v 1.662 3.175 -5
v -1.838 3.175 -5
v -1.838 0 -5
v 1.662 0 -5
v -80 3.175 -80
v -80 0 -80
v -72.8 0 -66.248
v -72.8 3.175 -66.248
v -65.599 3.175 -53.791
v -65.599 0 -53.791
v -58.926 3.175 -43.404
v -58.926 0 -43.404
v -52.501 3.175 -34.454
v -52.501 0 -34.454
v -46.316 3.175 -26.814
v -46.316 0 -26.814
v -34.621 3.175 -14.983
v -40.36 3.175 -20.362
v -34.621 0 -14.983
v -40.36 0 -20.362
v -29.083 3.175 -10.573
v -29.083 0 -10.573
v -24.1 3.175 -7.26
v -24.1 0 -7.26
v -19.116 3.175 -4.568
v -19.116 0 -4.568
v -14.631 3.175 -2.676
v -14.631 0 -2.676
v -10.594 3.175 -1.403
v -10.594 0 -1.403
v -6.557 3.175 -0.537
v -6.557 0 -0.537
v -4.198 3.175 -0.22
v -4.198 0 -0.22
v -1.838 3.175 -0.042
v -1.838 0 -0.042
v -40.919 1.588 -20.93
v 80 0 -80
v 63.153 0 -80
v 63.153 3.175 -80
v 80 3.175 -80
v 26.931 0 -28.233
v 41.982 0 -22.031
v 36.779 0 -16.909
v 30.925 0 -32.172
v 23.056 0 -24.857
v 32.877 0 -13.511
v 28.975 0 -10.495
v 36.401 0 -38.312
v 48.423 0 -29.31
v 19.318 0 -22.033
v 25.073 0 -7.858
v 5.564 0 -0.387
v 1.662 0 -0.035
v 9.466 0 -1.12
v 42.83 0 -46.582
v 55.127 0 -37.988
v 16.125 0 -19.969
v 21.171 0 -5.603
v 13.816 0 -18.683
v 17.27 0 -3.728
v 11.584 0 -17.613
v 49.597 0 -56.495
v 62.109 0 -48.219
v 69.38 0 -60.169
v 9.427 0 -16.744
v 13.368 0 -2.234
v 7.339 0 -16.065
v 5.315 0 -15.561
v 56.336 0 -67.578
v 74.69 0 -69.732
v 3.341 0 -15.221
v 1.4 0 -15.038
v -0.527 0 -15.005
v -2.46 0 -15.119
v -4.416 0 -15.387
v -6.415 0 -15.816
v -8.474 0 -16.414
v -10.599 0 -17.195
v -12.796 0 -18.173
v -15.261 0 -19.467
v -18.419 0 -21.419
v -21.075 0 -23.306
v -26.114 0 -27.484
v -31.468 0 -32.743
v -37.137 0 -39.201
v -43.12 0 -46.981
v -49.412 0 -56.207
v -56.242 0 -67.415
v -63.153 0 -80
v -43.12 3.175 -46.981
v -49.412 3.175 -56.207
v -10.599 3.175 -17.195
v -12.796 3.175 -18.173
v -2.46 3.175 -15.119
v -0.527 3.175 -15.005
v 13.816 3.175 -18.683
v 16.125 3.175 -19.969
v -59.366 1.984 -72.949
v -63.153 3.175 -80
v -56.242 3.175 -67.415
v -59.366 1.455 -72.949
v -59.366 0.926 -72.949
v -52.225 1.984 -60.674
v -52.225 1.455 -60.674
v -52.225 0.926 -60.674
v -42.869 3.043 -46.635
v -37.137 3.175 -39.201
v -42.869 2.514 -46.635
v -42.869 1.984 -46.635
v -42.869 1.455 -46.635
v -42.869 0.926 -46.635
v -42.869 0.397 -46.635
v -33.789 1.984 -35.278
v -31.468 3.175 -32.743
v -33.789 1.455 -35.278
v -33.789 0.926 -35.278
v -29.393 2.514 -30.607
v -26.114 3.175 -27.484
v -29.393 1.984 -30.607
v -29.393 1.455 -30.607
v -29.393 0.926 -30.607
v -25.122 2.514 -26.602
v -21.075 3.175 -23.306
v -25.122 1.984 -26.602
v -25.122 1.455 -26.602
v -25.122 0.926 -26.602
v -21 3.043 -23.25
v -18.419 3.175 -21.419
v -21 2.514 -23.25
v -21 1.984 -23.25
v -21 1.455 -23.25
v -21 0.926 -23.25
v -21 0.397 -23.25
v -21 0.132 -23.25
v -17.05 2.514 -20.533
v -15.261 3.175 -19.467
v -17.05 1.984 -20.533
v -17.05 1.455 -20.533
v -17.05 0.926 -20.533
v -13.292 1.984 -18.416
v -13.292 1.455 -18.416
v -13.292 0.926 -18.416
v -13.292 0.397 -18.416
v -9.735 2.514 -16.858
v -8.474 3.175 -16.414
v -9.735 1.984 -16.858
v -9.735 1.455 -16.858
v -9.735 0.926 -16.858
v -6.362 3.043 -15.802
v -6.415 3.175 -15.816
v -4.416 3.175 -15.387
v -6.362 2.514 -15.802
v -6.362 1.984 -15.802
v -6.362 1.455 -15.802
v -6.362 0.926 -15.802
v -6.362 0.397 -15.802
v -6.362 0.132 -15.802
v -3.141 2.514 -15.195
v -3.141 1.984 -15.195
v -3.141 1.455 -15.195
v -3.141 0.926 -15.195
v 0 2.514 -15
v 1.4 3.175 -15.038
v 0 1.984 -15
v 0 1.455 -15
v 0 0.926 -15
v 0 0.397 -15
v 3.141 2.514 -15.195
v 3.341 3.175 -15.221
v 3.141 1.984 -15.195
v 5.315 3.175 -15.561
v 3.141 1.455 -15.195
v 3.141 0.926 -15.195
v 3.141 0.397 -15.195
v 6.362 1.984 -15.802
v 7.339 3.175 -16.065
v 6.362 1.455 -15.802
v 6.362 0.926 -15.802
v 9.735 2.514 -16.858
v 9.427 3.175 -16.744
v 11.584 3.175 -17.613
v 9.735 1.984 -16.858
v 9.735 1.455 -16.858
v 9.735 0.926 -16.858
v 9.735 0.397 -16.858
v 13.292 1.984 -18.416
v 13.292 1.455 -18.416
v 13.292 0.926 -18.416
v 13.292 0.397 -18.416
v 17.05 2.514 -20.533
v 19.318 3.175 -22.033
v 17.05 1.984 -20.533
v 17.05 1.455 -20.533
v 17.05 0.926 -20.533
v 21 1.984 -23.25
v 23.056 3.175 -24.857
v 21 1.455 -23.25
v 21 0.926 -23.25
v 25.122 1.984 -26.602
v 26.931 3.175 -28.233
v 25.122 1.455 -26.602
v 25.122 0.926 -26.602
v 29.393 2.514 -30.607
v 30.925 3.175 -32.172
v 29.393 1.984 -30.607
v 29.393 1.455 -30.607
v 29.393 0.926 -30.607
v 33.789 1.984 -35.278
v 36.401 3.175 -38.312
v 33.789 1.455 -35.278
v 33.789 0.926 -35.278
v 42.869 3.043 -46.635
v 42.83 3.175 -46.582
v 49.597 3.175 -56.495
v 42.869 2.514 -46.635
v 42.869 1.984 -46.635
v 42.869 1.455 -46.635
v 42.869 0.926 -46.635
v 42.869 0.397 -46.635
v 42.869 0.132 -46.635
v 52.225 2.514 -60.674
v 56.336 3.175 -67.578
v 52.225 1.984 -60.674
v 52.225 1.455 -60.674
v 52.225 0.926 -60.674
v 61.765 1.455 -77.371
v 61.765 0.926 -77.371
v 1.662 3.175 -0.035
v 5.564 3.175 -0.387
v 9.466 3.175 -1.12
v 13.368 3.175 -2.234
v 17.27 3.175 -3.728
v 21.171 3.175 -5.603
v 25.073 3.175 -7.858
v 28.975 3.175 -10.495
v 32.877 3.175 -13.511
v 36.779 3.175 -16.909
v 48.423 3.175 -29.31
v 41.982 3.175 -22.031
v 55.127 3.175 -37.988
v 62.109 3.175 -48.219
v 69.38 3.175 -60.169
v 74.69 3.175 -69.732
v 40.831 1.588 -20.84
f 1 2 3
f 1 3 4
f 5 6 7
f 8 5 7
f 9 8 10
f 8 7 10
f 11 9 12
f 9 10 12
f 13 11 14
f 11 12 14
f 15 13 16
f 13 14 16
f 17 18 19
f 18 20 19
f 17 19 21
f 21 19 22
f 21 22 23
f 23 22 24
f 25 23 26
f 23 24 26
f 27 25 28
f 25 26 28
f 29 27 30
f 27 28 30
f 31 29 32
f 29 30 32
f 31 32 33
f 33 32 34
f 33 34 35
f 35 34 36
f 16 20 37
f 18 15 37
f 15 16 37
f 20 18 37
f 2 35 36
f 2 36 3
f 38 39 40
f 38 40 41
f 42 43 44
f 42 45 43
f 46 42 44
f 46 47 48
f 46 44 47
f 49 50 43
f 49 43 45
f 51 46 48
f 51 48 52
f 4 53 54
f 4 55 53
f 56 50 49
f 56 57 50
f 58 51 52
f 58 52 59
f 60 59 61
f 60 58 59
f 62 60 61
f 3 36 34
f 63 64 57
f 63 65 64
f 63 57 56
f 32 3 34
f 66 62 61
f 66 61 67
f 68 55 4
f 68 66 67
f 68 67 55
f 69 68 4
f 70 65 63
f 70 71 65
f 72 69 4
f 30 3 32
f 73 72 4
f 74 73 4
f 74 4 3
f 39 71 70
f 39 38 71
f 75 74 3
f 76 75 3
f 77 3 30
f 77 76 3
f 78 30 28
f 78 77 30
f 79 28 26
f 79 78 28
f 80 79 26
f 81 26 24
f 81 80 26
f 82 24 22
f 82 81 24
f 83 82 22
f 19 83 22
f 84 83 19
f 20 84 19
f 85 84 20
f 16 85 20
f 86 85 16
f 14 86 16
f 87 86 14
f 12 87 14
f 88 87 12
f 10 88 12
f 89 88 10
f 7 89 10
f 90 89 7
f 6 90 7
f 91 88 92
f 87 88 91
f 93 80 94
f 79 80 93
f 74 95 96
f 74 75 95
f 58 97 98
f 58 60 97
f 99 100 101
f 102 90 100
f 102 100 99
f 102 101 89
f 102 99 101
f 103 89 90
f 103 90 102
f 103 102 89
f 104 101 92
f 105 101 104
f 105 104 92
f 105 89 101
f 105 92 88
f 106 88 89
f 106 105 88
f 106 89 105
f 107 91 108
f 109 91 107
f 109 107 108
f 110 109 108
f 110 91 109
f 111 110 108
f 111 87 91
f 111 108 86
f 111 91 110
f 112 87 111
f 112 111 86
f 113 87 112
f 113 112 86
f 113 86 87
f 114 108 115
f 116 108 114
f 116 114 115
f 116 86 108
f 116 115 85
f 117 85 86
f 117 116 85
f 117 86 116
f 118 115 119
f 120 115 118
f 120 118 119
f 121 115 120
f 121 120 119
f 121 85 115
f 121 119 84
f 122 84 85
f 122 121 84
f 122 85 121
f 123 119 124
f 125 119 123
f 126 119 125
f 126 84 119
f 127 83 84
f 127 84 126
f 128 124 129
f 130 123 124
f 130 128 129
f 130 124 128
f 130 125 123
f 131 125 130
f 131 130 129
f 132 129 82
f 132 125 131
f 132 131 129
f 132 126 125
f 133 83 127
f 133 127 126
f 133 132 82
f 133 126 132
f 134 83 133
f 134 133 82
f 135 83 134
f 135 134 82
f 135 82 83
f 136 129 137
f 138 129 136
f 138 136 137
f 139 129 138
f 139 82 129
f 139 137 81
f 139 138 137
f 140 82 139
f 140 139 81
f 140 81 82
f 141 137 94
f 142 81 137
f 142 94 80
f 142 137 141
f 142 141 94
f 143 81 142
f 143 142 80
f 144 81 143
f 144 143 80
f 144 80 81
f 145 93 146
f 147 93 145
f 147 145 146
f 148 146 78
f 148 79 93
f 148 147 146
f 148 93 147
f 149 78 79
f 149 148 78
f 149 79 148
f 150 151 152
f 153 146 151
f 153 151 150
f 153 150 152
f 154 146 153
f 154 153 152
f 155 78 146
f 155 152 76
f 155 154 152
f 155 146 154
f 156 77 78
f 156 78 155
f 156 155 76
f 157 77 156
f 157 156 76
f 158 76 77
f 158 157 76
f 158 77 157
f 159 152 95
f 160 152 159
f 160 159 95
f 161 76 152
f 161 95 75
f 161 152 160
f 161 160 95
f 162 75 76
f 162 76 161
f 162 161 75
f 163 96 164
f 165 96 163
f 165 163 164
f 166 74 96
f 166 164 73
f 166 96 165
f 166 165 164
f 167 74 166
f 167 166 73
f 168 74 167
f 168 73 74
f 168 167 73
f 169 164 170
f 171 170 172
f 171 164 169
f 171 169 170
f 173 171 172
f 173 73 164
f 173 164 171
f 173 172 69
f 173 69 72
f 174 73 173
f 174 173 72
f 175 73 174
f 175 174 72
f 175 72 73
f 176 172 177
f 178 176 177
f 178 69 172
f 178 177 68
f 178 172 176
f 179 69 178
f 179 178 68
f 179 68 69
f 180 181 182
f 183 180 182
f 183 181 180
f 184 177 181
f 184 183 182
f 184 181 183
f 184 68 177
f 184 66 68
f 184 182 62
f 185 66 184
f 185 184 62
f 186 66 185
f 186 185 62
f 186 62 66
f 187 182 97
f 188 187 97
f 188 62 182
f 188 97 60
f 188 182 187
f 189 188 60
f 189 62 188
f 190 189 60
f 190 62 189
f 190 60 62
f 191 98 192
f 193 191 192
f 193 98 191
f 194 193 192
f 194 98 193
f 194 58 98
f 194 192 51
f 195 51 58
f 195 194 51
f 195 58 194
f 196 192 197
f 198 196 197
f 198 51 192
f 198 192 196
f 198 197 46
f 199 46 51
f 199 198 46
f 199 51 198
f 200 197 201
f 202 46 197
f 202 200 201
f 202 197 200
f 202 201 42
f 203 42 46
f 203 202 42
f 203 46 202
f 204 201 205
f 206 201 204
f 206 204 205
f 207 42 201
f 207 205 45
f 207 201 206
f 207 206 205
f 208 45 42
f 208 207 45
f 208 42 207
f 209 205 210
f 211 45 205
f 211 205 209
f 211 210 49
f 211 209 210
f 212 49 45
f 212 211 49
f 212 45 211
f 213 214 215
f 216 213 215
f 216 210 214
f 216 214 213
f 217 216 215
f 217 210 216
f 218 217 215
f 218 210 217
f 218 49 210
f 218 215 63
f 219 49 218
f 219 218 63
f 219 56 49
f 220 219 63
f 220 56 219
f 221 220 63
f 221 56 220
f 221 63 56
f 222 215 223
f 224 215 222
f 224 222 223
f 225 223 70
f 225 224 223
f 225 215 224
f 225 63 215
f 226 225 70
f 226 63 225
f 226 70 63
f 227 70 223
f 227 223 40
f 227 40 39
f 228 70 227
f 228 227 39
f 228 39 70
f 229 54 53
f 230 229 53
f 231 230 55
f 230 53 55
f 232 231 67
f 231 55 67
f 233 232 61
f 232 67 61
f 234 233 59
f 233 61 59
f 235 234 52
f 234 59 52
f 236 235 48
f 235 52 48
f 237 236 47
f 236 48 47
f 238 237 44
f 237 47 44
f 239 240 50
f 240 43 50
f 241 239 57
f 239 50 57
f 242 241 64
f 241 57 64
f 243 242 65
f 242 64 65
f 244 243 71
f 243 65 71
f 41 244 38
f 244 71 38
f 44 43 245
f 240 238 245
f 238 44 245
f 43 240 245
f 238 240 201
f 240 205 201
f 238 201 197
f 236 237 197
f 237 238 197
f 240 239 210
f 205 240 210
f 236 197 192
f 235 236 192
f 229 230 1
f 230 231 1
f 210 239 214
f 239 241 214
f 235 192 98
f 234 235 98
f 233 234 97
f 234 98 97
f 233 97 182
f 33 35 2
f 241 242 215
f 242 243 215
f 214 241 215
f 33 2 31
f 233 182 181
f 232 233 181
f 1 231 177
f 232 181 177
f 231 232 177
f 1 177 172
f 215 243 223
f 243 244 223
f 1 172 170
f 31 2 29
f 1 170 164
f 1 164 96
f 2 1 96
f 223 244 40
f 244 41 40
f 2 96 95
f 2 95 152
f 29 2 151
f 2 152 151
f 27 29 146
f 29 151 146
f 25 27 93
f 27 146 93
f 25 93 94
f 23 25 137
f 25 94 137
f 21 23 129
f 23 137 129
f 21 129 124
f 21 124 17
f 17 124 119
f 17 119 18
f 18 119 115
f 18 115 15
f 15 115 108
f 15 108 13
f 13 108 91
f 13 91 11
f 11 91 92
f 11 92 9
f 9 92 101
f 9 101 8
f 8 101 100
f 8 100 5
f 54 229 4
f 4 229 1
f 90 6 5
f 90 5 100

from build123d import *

# Parameters (mm, degrees)
BOSS_EXTRUDE2_DEPTH = 3.175
SKETCH2_W           = 3.5
SKETCH2_H           = 5
CUT_EXTRUDE1_DEPTH  = 114.181630536


with BuildPart() as part:
    # Sketch1 → Boss-Extrude2 (new body)
    with BuildSketch(Plane(origin=(0, 0, 0), x_dir=(1, 0, 0), z_dir=(0, 1, 0))):
        with BuildLine():
            add(Edge.make_bspline(
                [(-63.153287392, 80.000005207), (-62.690087061, 79.114787151), (-61.425361806, 76.720578148), (-59.365002639, 72.921941484), (-56.178071622, 67.245371862), (-52.217635229, 60.563206955), (-47.510051679, 53.209135647), (-42.857631564, 46.523268117), (-36.745022116, 38.503236865), (-29.311161013, 30.160913336), (-20.883951302, 22.824255391), (-13.153033777, 18.042065099), (-6.254689992, 15.505931404), (0, 14.747034298), (6.254689993, 15.505931404), (13.153033778, 18.042065099), (20.883951303, 22.824255391), (29.311161014, 30.160913336), (36.745022116, 38.503236864), (42.857631564, 46.523268116), (47.510051679, 53.209135647), (52.217635229, 60.563206955), (56.178071622, 67.245371862), (59.365002639, 72.921941484), (61.425361806, 76.720578148), (62.690087062, 79.114787152), (63.153287392, 80.000005207)],
                knots=[0.075765822, 0.075765822, 0.075765822, 0.075765822, 0.083776621, 0.097650734, 0.111524847, 0.139273072, 0.167021297, 0.194769522, 0.222517748, 0.278014198, 0.333510649, 0.389007099, 0.44450355, 0.5, 0.55549645, 0.610992901, 0.666489351, 0.721985802, 0.777482252, 0.805230478, 0.832978703, 0.860726928, 0.888475153, 0.902349266, 0.916223379, 0.924234178, 0.924234178, 0.924234178, 0.924234178], degree=3))
            Line((63.153287392, 80.000005207), (80, 80))
            add(Edge.make_bspline(
                [(-80, 80), (0, -80), (80, 80)],
                knots=[0.056028396, 0.056028396, 0.056028396, 0.943971604, 0.943971604, 0.943971604], degree=2))
            Line((-80, 80), (-63.153287392, 80.000005207))
        make_face()
    extrude(amount=BOSS_EXTRUDE2_DEPTH)

    # Sketch2 → Cut-Extrude1 (cut, through all)
    with BuildSketch(Plane(origin=(0, 3.175, 0), x_dir=(1, 0, 0), z_dir=(0, 1, 0))):
        with Locations((-0.08811954, 2.5)):
            Rectangle(SKETCH2_W, SKETCH2_H)
    extrude(amount=-CUT_EXTRUDE1_DEPTH, mode=Mode.SUBTRACT)


solid = part.part
